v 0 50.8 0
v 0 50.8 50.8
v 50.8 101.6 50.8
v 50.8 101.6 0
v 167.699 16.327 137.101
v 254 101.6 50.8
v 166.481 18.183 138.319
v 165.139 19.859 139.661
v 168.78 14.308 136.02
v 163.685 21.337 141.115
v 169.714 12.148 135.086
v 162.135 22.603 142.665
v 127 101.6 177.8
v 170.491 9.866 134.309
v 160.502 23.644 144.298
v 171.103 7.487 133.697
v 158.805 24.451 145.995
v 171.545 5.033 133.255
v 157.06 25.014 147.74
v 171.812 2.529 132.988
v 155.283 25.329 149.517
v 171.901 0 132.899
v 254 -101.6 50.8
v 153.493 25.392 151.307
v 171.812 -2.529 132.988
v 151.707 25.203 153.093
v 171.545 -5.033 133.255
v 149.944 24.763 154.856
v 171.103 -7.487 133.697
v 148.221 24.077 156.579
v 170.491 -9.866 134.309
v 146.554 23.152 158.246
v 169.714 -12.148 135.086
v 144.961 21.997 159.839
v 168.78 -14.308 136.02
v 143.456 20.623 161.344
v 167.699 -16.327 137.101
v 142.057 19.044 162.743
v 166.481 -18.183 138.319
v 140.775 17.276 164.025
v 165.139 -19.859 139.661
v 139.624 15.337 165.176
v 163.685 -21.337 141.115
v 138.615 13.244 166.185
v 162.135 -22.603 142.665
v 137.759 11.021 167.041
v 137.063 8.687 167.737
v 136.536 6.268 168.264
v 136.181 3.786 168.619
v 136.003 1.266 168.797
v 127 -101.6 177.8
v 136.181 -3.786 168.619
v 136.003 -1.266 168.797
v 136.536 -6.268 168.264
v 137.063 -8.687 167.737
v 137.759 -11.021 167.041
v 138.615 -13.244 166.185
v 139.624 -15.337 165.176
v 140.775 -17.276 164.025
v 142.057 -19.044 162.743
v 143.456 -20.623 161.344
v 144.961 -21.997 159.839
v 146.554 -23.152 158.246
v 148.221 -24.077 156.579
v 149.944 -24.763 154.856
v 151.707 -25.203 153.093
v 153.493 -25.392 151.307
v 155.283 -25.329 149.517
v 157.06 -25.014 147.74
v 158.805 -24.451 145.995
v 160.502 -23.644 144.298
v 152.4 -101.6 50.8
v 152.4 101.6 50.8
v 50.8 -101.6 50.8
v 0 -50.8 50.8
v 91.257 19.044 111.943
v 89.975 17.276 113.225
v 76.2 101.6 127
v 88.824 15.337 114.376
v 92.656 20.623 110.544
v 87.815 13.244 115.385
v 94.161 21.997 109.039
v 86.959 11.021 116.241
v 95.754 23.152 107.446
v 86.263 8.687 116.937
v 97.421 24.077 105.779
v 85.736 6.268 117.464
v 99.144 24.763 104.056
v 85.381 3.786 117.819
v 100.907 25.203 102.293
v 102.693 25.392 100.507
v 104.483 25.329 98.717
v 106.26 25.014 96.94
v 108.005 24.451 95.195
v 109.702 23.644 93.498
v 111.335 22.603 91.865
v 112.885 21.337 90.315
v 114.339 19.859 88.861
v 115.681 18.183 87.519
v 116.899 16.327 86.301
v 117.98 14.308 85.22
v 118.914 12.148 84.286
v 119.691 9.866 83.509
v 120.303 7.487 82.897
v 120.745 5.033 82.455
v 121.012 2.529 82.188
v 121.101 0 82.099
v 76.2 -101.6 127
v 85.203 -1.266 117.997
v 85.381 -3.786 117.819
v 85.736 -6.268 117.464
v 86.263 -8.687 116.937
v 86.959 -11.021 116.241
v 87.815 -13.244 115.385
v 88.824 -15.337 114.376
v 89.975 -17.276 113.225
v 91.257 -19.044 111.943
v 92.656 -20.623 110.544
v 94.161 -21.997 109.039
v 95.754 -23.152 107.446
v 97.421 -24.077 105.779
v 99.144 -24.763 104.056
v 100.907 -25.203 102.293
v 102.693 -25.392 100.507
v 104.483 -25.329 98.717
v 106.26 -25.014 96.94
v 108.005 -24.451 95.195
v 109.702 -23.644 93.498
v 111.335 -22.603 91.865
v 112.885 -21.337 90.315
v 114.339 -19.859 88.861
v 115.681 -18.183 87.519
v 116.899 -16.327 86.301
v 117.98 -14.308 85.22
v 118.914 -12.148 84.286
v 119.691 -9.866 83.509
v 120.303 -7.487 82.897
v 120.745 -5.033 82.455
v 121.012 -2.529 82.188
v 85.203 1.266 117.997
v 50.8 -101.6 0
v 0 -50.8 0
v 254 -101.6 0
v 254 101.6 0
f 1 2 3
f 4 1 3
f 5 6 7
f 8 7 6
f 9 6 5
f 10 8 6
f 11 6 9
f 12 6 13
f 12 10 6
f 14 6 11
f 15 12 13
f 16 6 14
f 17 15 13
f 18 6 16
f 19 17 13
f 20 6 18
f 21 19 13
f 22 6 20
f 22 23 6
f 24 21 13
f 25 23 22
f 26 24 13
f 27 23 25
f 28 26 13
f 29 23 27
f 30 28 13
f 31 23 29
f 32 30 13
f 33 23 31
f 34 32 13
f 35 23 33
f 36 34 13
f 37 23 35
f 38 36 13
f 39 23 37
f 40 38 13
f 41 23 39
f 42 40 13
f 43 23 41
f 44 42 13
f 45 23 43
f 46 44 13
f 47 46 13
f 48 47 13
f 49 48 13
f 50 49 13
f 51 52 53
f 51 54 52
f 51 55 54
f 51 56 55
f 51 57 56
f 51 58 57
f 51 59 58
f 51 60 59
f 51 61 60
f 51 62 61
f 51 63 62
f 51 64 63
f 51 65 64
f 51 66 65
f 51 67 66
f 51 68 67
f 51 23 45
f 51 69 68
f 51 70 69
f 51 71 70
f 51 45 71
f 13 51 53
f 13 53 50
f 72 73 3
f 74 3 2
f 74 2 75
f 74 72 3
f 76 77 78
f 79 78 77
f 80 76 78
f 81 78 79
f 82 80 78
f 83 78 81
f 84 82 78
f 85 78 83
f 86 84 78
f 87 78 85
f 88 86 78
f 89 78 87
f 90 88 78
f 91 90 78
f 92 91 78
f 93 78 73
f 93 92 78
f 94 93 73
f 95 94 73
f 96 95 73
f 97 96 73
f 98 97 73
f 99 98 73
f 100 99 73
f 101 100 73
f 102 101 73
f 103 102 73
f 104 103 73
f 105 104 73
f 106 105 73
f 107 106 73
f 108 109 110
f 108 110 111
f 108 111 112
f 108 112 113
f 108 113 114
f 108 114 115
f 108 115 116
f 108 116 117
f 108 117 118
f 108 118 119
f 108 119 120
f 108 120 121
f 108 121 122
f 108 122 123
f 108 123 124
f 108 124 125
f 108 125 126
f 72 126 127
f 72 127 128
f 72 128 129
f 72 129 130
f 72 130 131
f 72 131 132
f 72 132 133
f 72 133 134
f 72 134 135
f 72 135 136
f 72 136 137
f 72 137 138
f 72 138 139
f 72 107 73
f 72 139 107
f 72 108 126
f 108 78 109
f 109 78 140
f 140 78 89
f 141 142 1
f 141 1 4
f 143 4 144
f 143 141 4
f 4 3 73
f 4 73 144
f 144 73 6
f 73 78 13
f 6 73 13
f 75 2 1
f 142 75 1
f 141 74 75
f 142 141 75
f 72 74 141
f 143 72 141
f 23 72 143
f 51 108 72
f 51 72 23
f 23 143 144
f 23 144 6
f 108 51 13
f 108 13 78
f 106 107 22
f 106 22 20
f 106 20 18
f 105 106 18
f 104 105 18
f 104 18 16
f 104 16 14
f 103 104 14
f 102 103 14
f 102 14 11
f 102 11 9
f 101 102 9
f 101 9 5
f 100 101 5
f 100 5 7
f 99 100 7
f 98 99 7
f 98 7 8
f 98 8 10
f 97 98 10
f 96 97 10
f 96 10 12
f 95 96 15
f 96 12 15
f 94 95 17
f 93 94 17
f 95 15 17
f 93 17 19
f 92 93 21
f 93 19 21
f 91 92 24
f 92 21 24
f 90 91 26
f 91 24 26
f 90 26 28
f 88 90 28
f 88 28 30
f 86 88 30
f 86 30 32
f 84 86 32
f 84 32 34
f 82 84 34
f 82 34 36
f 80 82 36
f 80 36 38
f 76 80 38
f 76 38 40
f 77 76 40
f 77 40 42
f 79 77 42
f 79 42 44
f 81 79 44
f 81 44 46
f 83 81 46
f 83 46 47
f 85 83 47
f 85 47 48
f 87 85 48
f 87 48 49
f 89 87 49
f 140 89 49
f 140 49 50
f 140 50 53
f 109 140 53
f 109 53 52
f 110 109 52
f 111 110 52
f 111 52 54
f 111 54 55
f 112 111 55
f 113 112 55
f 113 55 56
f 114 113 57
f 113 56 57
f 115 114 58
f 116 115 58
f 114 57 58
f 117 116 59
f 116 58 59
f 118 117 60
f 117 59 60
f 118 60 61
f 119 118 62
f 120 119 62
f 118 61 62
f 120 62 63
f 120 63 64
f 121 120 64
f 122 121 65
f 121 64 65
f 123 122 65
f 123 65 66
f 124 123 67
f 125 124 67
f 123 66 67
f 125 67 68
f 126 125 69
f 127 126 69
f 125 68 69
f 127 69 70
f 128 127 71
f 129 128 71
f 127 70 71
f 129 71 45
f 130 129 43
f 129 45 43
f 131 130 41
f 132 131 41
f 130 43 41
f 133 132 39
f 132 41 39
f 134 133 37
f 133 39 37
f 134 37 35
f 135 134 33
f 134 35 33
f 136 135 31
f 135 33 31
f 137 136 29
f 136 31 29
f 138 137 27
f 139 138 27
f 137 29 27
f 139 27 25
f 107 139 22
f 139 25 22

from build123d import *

# Parameters (mm, degrees)
F1_DEPTH = 101.6
F3_DEPTH = 50.8
F4_R     = 25.4
F5_DEPTH = 88.9


with BuildPart() as f1:
    # F0 (on Front) → F1 (new body, symmetric)
    with BuildSketch(Plane.XZ):
        Polygon((0, 50.8), (0, 0), (254, 0), (254, 50.8), (127, 177.8), (76.2, 127), (152.4, 50.8), align=None)
    extrude(amount=F1_DEPTH, both=True)

    # F2 (on face) → F3 (cut)
    with BuildSketch(Plane.XY.offset(50.8)):
        Polygon((0, 101.6), (0, 50.8), (50.8, 101.6), align=None)
        Polygon((50.8, -101.6), (0, -50.8), (0, -101.6), align=None)
    extrude(amount=-F3_DEPTH, mode=Mode.SUBTRACT)

    # F4 (on face) → F5 (cut)
    with BuildSketch(Plane(origin=(152.4, 0, 152.4), x_dir=(0.707107, 0, -0.707107), z_dir=(0.707107, 0, 0.707107))):
        with Locations((2.178976, 0)):
            Circle(F4_R)
    extrude(amount=-F5_DEPTH, mode=Mode.SUBTRACT)


solid = f1.part
